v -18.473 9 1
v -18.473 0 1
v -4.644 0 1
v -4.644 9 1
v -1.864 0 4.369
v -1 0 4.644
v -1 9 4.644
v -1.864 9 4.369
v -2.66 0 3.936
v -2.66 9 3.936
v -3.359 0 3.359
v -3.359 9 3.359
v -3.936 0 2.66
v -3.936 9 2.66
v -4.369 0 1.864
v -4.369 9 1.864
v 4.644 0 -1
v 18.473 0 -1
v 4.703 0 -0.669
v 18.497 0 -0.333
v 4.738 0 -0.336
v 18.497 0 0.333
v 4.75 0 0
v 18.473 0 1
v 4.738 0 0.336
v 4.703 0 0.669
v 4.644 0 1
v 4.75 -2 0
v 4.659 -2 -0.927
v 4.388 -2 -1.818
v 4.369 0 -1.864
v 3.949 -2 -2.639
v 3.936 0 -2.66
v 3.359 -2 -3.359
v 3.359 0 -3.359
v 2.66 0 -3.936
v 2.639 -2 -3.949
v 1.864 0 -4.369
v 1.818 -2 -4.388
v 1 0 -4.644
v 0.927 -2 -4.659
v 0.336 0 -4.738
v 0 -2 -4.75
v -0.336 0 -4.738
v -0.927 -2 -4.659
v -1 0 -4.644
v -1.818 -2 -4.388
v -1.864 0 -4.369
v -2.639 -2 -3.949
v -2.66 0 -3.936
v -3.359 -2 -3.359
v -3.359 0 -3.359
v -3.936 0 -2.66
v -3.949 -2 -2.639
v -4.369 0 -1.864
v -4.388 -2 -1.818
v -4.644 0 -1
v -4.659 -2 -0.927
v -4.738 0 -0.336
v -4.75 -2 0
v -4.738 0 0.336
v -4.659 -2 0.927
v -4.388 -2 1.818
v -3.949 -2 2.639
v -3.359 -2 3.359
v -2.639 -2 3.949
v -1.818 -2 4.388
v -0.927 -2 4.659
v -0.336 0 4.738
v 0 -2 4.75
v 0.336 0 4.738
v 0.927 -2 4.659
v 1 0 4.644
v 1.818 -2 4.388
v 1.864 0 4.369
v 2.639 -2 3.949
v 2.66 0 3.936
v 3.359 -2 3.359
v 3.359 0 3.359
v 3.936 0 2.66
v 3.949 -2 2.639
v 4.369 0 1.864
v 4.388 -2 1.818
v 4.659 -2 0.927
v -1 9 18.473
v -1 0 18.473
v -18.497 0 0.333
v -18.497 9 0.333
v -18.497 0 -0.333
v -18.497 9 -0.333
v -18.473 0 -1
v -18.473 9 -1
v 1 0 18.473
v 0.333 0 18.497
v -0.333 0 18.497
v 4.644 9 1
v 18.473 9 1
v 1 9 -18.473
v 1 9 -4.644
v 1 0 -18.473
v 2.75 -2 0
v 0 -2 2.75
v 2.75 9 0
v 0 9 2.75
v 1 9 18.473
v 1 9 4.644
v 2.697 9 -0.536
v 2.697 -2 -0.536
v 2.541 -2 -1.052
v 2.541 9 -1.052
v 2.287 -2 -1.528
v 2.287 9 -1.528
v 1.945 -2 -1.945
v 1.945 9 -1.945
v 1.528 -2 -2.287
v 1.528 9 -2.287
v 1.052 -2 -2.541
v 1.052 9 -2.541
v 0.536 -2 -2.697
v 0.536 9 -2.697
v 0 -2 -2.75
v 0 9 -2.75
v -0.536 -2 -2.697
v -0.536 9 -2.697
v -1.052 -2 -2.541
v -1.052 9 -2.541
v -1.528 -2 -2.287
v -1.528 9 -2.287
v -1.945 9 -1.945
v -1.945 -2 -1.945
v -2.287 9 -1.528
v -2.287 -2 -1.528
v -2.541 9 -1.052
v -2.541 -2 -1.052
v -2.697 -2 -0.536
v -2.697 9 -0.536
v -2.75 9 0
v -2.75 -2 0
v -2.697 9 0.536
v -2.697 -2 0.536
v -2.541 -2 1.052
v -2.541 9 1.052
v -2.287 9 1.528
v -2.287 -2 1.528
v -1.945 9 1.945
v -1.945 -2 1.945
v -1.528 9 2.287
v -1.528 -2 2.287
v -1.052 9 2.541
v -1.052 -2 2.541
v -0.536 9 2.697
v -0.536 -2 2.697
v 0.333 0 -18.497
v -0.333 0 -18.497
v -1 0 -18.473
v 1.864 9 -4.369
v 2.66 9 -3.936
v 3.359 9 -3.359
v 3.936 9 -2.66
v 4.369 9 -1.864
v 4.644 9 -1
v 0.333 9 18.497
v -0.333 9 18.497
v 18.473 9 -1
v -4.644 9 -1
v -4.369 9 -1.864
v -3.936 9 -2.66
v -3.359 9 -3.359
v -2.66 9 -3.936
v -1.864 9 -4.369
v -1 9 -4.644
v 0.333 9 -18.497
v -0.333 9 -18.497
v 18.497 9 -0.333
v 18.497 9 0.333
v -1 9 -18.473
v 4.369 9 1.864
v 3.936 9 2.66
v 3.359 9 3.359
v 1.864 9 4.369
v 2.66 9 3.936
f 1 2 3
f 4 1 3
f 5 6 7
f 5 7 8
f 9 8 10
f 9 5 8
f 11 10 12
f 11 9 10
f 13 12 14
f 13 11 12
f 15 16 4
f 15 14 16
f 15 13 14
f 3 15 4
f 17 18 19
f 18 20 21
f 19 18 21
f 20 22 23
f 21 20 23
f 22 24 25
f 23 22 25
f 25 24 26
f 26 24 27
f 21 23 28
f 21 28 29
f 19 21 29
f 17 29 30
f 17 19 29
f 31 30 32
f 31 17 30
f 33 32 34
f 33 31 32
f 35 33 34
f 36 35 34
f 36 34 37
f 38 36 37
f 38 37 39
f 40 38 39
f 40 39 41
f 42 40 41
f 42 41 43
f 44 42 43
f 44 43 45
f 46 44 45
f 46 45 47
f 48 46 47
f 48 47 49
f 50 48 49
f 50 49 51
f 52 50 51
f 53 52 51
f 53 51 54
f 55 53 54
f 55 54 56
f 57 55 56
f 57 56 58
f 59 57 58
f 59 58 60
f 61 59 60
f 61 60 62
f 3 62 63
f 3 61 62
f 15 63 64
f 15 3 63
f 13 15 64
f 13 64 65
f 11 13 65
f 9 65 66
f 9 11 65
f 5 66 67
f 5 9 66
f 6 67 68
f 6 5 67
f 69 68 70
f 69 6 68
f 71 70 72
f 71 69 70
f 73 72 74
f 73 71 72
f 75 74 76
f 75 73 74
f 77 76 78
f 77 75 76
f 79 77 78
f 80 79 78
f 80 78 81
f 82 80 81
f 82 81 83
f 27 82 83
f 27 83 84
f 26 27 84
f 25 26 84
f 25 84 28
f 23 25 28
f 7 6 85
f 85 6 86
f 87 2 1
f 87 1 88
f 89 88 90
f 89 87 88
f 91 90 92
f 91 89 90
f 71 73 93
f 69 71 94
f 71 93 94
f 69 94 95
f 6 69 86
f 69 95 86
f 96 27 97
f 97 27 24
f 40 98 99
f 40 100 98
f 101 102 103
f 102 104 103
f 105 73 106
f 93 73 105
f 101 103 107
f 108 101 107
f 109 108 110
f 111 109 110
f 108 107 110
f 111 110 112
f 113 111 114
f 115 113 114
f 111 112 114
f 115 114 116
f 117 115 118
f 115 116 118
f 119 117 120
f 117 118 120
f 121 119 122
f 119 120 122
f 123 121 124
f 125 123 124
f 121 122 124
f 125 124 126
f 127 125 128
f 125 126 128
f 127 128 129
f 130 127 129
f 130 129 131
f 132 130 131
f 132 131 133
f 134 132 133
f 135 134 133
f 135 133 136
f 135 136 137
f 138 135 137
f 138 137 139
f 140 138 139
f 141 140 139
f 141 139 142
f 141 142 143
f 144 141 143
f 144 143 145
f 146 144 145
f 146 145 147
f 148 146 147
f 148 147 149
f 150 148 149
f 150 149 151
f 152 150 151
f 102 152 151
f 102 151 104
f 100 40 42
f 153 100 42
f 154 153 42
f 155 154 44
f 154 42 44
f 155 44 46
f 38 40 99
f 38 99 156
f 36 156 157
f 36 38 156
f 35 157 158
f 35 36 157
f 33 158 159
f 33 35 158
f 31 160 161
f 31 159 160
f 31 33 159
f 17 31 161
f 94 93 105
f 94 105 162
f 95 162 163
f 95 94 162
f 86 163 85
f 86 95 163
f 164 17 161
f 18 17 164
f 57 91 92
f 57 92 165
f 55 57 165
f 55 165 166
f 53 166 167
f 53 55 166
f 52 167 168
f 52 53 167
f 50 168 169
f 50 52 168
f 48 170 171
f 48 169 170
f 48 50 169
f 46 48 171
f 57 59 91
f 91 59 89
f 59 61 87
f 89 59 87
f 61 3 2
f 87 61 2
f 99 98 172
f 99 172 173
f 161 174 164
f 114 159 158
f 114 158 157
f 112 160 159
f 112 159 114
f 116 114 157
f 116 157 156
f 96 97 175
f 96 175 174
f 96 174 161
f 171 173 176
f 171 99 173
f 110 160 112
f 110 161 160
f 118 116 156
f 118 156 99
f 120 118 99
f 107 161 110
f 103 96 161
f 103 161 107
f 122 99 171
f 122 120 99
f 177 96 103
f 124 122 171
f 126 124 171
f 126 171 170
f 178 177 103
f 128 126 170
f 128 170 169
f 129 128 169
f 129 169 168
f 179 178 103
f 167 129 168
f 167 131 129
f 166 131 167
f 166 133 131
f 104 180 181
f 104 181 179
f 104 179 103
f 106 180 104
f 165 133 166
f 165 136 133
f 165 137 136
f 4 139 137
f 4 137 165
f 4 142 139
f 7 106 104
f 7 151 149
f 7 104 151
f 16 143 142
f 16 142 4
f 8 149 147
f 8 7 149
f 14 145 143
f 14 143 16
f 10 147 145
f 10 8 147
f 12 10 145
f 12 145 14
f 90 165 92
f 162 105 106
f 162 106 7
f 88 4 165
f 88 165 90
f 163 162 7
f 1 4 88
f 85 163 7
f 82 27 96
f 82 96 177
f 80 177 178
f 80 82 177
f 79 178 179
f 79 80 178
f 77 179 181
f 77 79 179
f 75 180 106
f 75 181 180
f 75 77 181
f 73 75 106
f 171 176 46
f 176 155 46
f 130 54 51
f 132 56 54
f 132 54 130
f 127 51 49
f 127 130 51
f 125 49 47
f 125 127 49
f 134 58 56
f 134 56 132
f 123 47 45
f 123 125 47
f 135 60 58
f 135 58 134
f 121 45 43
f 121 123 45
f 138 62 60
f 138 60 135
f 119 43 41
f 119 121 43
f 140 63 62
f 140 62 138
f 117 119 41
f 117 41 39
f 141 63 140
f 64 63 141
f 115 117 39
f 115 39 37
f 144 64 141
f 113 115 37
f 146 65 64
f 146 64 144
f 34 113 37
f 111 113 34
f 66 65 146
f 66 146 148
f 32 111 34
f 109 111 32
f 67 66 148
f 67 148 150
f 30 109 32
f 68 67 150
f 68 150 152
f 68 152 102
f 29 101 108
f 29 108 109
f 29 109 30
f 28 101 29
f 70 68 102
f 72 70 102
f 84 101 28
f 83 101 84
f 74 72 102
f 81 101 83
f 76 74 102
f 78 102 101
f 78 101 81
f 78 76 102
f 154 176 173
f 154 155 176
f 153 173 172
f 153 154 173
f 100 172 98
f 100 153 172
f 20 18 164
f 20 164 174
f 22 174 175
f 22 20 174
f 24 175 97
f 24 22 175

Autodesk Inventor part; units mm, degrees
ref_plane "YZ Plane" through (0, 0, 0) normal (1, 0, 0) x (0, 1, 0)
ref_plane "XZ Plane" through (0, 0, 0) normal (0, 1, 0) x (-1, 0, 0)
ref_plane "XY Plane" through (0, 0, 0) normal (0, 0, 1) x (1, 0, 0)
sketch "Sketch1" plane through (0, 0, 0) normal (0, 1, 0) x (-1, 0, 0)
  line L0 (1, -18.473) -> (1, -4.6435)
  line L1 (1, 4.6435) -> (1, 18.473)
  line L2 (-1, -18.473) -> (-1, -4.6435)
  line L3 (-1, 4.6435) -> (-1, 18.473)
  line L4 (18.473, 1) -> (4.6435, 1)
  line L5 (-4.6435, 1) -> (-18.473, 1)
  line L6 (18.473, -1) -> (4.6435, -1)
  line L7 (-4.6435, -1) -> (-18.473, -1)
  arc A0 (-18.473, 1) -> (-18.473, -1) centre (0, 0) ccw
  arc A1 (-1, -18.473) -> (1, -18.473) centre (0, 0) ccw
  arc A2 (18.473, -1) -> (18.473, 1) centre (0, 0) ccw
  arc A3 (1, 18.473) -> (-1, 18.473) centre (0, 0) ccw
  arc A4 (4.6435, 1) -> (1, 4.6435) centre (0, 0) ccw
  arc A5 (-1, 4.6435) -> (-4.6435, 1) centre (0, 0) ccw
  arc A6 (-4.6435, -1) -> (-1, -4.6435) centre (0, 0) ccw
  arc A7 (1, -4.6435) -> (4.6435, -1) centre (0, 0) ccw
  point P0 (1, -4.899)
  point P1 (1, 4.899)
  point P2 (4.899, -1)
  point P3 (-1, 4.899)
  point P4 (4.899, 1)
  point P5 (-4.899, 1)
  point P6 (-4.899, -1)
  point P7 (-1, -4.899)
  point P8 (-18.9737, -1)
  point P9 (-1, -18.9737)
  point P10 (1, -18.9737)
  point P11 (18.9737, -1)
  point P12 (18.9737, 1)
  point P13 (1, 18.9737)
  point P14 (-1, 18.9737)
  point P15 (-18.9737, 1)
  point P16 (17.4714, 1)
  point P17 (1, 17.4714)
  point P18 (-1, 17.4714)
  point P19 (-17.4714, 1)
  point P20 (-17.4714, -1)
  point P21 (-1, -17.4714)
  point P22 (1, -17.4714)
  point P23 (17.4714, -1)
extrude "Extrusion1" add sketch "Sketch1" along normal blind 9
sketch "Sketch2" plane through (0, 0, 0) normal (0, -1, 0) x (1, 0, 0)
  circle A0 centre (0, 0) radius 4.75
  dimension "d11" = 9.5
extrude "Extrusion2" add sketch "Sketch2" along normal blind 2
sketch "Sketch3" plane through (0, 9, 0) normal (0, 1, 0) x (1, 0, 0)
  arc A0 (2.75, 0) -> (0, -2.75) centre (0, 0) ccw
  line L0 (0, -2.75) -> (2.75, 0)
  dimension "d6" = 5.5
extrude "Extrusion3" cut sketch "Sketch3" against normal through all
properties part number "wheel of the walls"
